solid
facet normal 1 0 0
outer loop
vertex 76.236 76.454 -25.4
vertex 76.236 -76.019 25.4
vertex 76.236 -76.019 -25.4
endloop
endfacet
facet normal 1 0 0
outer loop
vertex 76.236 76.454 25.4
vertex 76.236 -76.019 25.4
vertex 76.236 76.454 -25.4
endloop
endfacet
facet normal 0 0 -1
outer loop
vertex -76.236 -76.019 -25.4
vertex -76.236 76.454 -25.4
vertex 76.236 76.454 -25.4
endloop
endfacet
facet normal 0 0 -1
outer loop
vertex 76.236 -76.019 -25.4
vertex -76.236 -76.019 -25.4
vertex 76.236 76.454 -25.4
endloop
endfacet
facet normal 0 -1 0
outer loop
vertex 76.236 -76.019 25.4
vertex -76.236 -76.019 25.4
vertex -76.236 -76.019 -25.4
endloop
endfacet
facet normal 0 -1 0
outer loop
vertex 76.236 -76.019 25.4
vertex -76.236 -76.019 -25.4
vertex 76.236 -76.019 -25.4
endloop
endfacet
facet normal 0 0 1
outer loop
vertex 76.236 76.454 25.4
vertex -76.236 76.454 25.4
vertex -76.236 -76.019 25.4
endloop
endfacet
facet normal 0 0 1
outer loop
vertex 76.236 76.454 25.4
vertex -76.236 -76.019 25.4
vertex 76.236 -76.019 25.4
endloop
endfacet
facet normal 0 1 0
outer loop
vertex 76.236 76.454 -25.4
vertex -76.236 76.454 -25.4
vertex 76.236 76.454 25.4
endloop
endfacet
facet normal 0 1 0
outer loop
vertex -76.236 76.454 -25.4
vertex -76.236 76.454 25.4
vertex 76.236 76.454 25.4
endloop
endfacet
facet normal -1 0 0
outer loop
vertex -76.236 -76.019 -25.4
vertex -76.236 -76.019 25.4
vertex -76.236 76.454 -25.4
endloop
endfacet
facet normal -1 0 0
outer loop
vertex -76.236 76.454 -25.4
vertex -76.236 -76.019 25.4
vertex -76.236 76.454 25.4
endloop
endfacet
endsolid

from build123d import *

# Parameters (mm, degrees)
F0_W     = 152.4727120996
F0_H     = 152.4727195501
F1_DEPTH = 12.7
F2_DEPTH = 12.7
F3_DEPTH = 12.7
F4_DEPTH = 12.7


with BuildPart() as f1:
    # F0 (on Top) → F1 (new body)
    with BuildSketch(Plane.XY):
        with Locations((3.7253e-06, 0.2178177238)):
            Rectangle(F0_W, F0_H)
    extrude(amount=F1_DEPTH)

    # F2 (add): a face of the model
    f2_faces = [f1.faces().sort_by_distance(p)[0] for p in [
        (3.7253e-06, 0.2178177238, 12.7),
    ]]
    extrude(f2_faces, amount=F2_DEPTH)

    # F3 (add): a face of the model
    f3_faces = [f1.faces().sort_by_distance(p)[0] for p in [
        (3.7253e-06, 0.2178177238, 0),
    ]]
    extrude(f3_faces, amount=F3_DEPTH)

    # F4 (add): a face of the model
    f4_faces = [f1.faces().sort_by_distance(p)[0] for p in [
        (3.7253e-06, 0.2178177238, -12.7),
    ]]
    extrude(f4_faces, amount=F4_DEPTH)


solid = f1.part
